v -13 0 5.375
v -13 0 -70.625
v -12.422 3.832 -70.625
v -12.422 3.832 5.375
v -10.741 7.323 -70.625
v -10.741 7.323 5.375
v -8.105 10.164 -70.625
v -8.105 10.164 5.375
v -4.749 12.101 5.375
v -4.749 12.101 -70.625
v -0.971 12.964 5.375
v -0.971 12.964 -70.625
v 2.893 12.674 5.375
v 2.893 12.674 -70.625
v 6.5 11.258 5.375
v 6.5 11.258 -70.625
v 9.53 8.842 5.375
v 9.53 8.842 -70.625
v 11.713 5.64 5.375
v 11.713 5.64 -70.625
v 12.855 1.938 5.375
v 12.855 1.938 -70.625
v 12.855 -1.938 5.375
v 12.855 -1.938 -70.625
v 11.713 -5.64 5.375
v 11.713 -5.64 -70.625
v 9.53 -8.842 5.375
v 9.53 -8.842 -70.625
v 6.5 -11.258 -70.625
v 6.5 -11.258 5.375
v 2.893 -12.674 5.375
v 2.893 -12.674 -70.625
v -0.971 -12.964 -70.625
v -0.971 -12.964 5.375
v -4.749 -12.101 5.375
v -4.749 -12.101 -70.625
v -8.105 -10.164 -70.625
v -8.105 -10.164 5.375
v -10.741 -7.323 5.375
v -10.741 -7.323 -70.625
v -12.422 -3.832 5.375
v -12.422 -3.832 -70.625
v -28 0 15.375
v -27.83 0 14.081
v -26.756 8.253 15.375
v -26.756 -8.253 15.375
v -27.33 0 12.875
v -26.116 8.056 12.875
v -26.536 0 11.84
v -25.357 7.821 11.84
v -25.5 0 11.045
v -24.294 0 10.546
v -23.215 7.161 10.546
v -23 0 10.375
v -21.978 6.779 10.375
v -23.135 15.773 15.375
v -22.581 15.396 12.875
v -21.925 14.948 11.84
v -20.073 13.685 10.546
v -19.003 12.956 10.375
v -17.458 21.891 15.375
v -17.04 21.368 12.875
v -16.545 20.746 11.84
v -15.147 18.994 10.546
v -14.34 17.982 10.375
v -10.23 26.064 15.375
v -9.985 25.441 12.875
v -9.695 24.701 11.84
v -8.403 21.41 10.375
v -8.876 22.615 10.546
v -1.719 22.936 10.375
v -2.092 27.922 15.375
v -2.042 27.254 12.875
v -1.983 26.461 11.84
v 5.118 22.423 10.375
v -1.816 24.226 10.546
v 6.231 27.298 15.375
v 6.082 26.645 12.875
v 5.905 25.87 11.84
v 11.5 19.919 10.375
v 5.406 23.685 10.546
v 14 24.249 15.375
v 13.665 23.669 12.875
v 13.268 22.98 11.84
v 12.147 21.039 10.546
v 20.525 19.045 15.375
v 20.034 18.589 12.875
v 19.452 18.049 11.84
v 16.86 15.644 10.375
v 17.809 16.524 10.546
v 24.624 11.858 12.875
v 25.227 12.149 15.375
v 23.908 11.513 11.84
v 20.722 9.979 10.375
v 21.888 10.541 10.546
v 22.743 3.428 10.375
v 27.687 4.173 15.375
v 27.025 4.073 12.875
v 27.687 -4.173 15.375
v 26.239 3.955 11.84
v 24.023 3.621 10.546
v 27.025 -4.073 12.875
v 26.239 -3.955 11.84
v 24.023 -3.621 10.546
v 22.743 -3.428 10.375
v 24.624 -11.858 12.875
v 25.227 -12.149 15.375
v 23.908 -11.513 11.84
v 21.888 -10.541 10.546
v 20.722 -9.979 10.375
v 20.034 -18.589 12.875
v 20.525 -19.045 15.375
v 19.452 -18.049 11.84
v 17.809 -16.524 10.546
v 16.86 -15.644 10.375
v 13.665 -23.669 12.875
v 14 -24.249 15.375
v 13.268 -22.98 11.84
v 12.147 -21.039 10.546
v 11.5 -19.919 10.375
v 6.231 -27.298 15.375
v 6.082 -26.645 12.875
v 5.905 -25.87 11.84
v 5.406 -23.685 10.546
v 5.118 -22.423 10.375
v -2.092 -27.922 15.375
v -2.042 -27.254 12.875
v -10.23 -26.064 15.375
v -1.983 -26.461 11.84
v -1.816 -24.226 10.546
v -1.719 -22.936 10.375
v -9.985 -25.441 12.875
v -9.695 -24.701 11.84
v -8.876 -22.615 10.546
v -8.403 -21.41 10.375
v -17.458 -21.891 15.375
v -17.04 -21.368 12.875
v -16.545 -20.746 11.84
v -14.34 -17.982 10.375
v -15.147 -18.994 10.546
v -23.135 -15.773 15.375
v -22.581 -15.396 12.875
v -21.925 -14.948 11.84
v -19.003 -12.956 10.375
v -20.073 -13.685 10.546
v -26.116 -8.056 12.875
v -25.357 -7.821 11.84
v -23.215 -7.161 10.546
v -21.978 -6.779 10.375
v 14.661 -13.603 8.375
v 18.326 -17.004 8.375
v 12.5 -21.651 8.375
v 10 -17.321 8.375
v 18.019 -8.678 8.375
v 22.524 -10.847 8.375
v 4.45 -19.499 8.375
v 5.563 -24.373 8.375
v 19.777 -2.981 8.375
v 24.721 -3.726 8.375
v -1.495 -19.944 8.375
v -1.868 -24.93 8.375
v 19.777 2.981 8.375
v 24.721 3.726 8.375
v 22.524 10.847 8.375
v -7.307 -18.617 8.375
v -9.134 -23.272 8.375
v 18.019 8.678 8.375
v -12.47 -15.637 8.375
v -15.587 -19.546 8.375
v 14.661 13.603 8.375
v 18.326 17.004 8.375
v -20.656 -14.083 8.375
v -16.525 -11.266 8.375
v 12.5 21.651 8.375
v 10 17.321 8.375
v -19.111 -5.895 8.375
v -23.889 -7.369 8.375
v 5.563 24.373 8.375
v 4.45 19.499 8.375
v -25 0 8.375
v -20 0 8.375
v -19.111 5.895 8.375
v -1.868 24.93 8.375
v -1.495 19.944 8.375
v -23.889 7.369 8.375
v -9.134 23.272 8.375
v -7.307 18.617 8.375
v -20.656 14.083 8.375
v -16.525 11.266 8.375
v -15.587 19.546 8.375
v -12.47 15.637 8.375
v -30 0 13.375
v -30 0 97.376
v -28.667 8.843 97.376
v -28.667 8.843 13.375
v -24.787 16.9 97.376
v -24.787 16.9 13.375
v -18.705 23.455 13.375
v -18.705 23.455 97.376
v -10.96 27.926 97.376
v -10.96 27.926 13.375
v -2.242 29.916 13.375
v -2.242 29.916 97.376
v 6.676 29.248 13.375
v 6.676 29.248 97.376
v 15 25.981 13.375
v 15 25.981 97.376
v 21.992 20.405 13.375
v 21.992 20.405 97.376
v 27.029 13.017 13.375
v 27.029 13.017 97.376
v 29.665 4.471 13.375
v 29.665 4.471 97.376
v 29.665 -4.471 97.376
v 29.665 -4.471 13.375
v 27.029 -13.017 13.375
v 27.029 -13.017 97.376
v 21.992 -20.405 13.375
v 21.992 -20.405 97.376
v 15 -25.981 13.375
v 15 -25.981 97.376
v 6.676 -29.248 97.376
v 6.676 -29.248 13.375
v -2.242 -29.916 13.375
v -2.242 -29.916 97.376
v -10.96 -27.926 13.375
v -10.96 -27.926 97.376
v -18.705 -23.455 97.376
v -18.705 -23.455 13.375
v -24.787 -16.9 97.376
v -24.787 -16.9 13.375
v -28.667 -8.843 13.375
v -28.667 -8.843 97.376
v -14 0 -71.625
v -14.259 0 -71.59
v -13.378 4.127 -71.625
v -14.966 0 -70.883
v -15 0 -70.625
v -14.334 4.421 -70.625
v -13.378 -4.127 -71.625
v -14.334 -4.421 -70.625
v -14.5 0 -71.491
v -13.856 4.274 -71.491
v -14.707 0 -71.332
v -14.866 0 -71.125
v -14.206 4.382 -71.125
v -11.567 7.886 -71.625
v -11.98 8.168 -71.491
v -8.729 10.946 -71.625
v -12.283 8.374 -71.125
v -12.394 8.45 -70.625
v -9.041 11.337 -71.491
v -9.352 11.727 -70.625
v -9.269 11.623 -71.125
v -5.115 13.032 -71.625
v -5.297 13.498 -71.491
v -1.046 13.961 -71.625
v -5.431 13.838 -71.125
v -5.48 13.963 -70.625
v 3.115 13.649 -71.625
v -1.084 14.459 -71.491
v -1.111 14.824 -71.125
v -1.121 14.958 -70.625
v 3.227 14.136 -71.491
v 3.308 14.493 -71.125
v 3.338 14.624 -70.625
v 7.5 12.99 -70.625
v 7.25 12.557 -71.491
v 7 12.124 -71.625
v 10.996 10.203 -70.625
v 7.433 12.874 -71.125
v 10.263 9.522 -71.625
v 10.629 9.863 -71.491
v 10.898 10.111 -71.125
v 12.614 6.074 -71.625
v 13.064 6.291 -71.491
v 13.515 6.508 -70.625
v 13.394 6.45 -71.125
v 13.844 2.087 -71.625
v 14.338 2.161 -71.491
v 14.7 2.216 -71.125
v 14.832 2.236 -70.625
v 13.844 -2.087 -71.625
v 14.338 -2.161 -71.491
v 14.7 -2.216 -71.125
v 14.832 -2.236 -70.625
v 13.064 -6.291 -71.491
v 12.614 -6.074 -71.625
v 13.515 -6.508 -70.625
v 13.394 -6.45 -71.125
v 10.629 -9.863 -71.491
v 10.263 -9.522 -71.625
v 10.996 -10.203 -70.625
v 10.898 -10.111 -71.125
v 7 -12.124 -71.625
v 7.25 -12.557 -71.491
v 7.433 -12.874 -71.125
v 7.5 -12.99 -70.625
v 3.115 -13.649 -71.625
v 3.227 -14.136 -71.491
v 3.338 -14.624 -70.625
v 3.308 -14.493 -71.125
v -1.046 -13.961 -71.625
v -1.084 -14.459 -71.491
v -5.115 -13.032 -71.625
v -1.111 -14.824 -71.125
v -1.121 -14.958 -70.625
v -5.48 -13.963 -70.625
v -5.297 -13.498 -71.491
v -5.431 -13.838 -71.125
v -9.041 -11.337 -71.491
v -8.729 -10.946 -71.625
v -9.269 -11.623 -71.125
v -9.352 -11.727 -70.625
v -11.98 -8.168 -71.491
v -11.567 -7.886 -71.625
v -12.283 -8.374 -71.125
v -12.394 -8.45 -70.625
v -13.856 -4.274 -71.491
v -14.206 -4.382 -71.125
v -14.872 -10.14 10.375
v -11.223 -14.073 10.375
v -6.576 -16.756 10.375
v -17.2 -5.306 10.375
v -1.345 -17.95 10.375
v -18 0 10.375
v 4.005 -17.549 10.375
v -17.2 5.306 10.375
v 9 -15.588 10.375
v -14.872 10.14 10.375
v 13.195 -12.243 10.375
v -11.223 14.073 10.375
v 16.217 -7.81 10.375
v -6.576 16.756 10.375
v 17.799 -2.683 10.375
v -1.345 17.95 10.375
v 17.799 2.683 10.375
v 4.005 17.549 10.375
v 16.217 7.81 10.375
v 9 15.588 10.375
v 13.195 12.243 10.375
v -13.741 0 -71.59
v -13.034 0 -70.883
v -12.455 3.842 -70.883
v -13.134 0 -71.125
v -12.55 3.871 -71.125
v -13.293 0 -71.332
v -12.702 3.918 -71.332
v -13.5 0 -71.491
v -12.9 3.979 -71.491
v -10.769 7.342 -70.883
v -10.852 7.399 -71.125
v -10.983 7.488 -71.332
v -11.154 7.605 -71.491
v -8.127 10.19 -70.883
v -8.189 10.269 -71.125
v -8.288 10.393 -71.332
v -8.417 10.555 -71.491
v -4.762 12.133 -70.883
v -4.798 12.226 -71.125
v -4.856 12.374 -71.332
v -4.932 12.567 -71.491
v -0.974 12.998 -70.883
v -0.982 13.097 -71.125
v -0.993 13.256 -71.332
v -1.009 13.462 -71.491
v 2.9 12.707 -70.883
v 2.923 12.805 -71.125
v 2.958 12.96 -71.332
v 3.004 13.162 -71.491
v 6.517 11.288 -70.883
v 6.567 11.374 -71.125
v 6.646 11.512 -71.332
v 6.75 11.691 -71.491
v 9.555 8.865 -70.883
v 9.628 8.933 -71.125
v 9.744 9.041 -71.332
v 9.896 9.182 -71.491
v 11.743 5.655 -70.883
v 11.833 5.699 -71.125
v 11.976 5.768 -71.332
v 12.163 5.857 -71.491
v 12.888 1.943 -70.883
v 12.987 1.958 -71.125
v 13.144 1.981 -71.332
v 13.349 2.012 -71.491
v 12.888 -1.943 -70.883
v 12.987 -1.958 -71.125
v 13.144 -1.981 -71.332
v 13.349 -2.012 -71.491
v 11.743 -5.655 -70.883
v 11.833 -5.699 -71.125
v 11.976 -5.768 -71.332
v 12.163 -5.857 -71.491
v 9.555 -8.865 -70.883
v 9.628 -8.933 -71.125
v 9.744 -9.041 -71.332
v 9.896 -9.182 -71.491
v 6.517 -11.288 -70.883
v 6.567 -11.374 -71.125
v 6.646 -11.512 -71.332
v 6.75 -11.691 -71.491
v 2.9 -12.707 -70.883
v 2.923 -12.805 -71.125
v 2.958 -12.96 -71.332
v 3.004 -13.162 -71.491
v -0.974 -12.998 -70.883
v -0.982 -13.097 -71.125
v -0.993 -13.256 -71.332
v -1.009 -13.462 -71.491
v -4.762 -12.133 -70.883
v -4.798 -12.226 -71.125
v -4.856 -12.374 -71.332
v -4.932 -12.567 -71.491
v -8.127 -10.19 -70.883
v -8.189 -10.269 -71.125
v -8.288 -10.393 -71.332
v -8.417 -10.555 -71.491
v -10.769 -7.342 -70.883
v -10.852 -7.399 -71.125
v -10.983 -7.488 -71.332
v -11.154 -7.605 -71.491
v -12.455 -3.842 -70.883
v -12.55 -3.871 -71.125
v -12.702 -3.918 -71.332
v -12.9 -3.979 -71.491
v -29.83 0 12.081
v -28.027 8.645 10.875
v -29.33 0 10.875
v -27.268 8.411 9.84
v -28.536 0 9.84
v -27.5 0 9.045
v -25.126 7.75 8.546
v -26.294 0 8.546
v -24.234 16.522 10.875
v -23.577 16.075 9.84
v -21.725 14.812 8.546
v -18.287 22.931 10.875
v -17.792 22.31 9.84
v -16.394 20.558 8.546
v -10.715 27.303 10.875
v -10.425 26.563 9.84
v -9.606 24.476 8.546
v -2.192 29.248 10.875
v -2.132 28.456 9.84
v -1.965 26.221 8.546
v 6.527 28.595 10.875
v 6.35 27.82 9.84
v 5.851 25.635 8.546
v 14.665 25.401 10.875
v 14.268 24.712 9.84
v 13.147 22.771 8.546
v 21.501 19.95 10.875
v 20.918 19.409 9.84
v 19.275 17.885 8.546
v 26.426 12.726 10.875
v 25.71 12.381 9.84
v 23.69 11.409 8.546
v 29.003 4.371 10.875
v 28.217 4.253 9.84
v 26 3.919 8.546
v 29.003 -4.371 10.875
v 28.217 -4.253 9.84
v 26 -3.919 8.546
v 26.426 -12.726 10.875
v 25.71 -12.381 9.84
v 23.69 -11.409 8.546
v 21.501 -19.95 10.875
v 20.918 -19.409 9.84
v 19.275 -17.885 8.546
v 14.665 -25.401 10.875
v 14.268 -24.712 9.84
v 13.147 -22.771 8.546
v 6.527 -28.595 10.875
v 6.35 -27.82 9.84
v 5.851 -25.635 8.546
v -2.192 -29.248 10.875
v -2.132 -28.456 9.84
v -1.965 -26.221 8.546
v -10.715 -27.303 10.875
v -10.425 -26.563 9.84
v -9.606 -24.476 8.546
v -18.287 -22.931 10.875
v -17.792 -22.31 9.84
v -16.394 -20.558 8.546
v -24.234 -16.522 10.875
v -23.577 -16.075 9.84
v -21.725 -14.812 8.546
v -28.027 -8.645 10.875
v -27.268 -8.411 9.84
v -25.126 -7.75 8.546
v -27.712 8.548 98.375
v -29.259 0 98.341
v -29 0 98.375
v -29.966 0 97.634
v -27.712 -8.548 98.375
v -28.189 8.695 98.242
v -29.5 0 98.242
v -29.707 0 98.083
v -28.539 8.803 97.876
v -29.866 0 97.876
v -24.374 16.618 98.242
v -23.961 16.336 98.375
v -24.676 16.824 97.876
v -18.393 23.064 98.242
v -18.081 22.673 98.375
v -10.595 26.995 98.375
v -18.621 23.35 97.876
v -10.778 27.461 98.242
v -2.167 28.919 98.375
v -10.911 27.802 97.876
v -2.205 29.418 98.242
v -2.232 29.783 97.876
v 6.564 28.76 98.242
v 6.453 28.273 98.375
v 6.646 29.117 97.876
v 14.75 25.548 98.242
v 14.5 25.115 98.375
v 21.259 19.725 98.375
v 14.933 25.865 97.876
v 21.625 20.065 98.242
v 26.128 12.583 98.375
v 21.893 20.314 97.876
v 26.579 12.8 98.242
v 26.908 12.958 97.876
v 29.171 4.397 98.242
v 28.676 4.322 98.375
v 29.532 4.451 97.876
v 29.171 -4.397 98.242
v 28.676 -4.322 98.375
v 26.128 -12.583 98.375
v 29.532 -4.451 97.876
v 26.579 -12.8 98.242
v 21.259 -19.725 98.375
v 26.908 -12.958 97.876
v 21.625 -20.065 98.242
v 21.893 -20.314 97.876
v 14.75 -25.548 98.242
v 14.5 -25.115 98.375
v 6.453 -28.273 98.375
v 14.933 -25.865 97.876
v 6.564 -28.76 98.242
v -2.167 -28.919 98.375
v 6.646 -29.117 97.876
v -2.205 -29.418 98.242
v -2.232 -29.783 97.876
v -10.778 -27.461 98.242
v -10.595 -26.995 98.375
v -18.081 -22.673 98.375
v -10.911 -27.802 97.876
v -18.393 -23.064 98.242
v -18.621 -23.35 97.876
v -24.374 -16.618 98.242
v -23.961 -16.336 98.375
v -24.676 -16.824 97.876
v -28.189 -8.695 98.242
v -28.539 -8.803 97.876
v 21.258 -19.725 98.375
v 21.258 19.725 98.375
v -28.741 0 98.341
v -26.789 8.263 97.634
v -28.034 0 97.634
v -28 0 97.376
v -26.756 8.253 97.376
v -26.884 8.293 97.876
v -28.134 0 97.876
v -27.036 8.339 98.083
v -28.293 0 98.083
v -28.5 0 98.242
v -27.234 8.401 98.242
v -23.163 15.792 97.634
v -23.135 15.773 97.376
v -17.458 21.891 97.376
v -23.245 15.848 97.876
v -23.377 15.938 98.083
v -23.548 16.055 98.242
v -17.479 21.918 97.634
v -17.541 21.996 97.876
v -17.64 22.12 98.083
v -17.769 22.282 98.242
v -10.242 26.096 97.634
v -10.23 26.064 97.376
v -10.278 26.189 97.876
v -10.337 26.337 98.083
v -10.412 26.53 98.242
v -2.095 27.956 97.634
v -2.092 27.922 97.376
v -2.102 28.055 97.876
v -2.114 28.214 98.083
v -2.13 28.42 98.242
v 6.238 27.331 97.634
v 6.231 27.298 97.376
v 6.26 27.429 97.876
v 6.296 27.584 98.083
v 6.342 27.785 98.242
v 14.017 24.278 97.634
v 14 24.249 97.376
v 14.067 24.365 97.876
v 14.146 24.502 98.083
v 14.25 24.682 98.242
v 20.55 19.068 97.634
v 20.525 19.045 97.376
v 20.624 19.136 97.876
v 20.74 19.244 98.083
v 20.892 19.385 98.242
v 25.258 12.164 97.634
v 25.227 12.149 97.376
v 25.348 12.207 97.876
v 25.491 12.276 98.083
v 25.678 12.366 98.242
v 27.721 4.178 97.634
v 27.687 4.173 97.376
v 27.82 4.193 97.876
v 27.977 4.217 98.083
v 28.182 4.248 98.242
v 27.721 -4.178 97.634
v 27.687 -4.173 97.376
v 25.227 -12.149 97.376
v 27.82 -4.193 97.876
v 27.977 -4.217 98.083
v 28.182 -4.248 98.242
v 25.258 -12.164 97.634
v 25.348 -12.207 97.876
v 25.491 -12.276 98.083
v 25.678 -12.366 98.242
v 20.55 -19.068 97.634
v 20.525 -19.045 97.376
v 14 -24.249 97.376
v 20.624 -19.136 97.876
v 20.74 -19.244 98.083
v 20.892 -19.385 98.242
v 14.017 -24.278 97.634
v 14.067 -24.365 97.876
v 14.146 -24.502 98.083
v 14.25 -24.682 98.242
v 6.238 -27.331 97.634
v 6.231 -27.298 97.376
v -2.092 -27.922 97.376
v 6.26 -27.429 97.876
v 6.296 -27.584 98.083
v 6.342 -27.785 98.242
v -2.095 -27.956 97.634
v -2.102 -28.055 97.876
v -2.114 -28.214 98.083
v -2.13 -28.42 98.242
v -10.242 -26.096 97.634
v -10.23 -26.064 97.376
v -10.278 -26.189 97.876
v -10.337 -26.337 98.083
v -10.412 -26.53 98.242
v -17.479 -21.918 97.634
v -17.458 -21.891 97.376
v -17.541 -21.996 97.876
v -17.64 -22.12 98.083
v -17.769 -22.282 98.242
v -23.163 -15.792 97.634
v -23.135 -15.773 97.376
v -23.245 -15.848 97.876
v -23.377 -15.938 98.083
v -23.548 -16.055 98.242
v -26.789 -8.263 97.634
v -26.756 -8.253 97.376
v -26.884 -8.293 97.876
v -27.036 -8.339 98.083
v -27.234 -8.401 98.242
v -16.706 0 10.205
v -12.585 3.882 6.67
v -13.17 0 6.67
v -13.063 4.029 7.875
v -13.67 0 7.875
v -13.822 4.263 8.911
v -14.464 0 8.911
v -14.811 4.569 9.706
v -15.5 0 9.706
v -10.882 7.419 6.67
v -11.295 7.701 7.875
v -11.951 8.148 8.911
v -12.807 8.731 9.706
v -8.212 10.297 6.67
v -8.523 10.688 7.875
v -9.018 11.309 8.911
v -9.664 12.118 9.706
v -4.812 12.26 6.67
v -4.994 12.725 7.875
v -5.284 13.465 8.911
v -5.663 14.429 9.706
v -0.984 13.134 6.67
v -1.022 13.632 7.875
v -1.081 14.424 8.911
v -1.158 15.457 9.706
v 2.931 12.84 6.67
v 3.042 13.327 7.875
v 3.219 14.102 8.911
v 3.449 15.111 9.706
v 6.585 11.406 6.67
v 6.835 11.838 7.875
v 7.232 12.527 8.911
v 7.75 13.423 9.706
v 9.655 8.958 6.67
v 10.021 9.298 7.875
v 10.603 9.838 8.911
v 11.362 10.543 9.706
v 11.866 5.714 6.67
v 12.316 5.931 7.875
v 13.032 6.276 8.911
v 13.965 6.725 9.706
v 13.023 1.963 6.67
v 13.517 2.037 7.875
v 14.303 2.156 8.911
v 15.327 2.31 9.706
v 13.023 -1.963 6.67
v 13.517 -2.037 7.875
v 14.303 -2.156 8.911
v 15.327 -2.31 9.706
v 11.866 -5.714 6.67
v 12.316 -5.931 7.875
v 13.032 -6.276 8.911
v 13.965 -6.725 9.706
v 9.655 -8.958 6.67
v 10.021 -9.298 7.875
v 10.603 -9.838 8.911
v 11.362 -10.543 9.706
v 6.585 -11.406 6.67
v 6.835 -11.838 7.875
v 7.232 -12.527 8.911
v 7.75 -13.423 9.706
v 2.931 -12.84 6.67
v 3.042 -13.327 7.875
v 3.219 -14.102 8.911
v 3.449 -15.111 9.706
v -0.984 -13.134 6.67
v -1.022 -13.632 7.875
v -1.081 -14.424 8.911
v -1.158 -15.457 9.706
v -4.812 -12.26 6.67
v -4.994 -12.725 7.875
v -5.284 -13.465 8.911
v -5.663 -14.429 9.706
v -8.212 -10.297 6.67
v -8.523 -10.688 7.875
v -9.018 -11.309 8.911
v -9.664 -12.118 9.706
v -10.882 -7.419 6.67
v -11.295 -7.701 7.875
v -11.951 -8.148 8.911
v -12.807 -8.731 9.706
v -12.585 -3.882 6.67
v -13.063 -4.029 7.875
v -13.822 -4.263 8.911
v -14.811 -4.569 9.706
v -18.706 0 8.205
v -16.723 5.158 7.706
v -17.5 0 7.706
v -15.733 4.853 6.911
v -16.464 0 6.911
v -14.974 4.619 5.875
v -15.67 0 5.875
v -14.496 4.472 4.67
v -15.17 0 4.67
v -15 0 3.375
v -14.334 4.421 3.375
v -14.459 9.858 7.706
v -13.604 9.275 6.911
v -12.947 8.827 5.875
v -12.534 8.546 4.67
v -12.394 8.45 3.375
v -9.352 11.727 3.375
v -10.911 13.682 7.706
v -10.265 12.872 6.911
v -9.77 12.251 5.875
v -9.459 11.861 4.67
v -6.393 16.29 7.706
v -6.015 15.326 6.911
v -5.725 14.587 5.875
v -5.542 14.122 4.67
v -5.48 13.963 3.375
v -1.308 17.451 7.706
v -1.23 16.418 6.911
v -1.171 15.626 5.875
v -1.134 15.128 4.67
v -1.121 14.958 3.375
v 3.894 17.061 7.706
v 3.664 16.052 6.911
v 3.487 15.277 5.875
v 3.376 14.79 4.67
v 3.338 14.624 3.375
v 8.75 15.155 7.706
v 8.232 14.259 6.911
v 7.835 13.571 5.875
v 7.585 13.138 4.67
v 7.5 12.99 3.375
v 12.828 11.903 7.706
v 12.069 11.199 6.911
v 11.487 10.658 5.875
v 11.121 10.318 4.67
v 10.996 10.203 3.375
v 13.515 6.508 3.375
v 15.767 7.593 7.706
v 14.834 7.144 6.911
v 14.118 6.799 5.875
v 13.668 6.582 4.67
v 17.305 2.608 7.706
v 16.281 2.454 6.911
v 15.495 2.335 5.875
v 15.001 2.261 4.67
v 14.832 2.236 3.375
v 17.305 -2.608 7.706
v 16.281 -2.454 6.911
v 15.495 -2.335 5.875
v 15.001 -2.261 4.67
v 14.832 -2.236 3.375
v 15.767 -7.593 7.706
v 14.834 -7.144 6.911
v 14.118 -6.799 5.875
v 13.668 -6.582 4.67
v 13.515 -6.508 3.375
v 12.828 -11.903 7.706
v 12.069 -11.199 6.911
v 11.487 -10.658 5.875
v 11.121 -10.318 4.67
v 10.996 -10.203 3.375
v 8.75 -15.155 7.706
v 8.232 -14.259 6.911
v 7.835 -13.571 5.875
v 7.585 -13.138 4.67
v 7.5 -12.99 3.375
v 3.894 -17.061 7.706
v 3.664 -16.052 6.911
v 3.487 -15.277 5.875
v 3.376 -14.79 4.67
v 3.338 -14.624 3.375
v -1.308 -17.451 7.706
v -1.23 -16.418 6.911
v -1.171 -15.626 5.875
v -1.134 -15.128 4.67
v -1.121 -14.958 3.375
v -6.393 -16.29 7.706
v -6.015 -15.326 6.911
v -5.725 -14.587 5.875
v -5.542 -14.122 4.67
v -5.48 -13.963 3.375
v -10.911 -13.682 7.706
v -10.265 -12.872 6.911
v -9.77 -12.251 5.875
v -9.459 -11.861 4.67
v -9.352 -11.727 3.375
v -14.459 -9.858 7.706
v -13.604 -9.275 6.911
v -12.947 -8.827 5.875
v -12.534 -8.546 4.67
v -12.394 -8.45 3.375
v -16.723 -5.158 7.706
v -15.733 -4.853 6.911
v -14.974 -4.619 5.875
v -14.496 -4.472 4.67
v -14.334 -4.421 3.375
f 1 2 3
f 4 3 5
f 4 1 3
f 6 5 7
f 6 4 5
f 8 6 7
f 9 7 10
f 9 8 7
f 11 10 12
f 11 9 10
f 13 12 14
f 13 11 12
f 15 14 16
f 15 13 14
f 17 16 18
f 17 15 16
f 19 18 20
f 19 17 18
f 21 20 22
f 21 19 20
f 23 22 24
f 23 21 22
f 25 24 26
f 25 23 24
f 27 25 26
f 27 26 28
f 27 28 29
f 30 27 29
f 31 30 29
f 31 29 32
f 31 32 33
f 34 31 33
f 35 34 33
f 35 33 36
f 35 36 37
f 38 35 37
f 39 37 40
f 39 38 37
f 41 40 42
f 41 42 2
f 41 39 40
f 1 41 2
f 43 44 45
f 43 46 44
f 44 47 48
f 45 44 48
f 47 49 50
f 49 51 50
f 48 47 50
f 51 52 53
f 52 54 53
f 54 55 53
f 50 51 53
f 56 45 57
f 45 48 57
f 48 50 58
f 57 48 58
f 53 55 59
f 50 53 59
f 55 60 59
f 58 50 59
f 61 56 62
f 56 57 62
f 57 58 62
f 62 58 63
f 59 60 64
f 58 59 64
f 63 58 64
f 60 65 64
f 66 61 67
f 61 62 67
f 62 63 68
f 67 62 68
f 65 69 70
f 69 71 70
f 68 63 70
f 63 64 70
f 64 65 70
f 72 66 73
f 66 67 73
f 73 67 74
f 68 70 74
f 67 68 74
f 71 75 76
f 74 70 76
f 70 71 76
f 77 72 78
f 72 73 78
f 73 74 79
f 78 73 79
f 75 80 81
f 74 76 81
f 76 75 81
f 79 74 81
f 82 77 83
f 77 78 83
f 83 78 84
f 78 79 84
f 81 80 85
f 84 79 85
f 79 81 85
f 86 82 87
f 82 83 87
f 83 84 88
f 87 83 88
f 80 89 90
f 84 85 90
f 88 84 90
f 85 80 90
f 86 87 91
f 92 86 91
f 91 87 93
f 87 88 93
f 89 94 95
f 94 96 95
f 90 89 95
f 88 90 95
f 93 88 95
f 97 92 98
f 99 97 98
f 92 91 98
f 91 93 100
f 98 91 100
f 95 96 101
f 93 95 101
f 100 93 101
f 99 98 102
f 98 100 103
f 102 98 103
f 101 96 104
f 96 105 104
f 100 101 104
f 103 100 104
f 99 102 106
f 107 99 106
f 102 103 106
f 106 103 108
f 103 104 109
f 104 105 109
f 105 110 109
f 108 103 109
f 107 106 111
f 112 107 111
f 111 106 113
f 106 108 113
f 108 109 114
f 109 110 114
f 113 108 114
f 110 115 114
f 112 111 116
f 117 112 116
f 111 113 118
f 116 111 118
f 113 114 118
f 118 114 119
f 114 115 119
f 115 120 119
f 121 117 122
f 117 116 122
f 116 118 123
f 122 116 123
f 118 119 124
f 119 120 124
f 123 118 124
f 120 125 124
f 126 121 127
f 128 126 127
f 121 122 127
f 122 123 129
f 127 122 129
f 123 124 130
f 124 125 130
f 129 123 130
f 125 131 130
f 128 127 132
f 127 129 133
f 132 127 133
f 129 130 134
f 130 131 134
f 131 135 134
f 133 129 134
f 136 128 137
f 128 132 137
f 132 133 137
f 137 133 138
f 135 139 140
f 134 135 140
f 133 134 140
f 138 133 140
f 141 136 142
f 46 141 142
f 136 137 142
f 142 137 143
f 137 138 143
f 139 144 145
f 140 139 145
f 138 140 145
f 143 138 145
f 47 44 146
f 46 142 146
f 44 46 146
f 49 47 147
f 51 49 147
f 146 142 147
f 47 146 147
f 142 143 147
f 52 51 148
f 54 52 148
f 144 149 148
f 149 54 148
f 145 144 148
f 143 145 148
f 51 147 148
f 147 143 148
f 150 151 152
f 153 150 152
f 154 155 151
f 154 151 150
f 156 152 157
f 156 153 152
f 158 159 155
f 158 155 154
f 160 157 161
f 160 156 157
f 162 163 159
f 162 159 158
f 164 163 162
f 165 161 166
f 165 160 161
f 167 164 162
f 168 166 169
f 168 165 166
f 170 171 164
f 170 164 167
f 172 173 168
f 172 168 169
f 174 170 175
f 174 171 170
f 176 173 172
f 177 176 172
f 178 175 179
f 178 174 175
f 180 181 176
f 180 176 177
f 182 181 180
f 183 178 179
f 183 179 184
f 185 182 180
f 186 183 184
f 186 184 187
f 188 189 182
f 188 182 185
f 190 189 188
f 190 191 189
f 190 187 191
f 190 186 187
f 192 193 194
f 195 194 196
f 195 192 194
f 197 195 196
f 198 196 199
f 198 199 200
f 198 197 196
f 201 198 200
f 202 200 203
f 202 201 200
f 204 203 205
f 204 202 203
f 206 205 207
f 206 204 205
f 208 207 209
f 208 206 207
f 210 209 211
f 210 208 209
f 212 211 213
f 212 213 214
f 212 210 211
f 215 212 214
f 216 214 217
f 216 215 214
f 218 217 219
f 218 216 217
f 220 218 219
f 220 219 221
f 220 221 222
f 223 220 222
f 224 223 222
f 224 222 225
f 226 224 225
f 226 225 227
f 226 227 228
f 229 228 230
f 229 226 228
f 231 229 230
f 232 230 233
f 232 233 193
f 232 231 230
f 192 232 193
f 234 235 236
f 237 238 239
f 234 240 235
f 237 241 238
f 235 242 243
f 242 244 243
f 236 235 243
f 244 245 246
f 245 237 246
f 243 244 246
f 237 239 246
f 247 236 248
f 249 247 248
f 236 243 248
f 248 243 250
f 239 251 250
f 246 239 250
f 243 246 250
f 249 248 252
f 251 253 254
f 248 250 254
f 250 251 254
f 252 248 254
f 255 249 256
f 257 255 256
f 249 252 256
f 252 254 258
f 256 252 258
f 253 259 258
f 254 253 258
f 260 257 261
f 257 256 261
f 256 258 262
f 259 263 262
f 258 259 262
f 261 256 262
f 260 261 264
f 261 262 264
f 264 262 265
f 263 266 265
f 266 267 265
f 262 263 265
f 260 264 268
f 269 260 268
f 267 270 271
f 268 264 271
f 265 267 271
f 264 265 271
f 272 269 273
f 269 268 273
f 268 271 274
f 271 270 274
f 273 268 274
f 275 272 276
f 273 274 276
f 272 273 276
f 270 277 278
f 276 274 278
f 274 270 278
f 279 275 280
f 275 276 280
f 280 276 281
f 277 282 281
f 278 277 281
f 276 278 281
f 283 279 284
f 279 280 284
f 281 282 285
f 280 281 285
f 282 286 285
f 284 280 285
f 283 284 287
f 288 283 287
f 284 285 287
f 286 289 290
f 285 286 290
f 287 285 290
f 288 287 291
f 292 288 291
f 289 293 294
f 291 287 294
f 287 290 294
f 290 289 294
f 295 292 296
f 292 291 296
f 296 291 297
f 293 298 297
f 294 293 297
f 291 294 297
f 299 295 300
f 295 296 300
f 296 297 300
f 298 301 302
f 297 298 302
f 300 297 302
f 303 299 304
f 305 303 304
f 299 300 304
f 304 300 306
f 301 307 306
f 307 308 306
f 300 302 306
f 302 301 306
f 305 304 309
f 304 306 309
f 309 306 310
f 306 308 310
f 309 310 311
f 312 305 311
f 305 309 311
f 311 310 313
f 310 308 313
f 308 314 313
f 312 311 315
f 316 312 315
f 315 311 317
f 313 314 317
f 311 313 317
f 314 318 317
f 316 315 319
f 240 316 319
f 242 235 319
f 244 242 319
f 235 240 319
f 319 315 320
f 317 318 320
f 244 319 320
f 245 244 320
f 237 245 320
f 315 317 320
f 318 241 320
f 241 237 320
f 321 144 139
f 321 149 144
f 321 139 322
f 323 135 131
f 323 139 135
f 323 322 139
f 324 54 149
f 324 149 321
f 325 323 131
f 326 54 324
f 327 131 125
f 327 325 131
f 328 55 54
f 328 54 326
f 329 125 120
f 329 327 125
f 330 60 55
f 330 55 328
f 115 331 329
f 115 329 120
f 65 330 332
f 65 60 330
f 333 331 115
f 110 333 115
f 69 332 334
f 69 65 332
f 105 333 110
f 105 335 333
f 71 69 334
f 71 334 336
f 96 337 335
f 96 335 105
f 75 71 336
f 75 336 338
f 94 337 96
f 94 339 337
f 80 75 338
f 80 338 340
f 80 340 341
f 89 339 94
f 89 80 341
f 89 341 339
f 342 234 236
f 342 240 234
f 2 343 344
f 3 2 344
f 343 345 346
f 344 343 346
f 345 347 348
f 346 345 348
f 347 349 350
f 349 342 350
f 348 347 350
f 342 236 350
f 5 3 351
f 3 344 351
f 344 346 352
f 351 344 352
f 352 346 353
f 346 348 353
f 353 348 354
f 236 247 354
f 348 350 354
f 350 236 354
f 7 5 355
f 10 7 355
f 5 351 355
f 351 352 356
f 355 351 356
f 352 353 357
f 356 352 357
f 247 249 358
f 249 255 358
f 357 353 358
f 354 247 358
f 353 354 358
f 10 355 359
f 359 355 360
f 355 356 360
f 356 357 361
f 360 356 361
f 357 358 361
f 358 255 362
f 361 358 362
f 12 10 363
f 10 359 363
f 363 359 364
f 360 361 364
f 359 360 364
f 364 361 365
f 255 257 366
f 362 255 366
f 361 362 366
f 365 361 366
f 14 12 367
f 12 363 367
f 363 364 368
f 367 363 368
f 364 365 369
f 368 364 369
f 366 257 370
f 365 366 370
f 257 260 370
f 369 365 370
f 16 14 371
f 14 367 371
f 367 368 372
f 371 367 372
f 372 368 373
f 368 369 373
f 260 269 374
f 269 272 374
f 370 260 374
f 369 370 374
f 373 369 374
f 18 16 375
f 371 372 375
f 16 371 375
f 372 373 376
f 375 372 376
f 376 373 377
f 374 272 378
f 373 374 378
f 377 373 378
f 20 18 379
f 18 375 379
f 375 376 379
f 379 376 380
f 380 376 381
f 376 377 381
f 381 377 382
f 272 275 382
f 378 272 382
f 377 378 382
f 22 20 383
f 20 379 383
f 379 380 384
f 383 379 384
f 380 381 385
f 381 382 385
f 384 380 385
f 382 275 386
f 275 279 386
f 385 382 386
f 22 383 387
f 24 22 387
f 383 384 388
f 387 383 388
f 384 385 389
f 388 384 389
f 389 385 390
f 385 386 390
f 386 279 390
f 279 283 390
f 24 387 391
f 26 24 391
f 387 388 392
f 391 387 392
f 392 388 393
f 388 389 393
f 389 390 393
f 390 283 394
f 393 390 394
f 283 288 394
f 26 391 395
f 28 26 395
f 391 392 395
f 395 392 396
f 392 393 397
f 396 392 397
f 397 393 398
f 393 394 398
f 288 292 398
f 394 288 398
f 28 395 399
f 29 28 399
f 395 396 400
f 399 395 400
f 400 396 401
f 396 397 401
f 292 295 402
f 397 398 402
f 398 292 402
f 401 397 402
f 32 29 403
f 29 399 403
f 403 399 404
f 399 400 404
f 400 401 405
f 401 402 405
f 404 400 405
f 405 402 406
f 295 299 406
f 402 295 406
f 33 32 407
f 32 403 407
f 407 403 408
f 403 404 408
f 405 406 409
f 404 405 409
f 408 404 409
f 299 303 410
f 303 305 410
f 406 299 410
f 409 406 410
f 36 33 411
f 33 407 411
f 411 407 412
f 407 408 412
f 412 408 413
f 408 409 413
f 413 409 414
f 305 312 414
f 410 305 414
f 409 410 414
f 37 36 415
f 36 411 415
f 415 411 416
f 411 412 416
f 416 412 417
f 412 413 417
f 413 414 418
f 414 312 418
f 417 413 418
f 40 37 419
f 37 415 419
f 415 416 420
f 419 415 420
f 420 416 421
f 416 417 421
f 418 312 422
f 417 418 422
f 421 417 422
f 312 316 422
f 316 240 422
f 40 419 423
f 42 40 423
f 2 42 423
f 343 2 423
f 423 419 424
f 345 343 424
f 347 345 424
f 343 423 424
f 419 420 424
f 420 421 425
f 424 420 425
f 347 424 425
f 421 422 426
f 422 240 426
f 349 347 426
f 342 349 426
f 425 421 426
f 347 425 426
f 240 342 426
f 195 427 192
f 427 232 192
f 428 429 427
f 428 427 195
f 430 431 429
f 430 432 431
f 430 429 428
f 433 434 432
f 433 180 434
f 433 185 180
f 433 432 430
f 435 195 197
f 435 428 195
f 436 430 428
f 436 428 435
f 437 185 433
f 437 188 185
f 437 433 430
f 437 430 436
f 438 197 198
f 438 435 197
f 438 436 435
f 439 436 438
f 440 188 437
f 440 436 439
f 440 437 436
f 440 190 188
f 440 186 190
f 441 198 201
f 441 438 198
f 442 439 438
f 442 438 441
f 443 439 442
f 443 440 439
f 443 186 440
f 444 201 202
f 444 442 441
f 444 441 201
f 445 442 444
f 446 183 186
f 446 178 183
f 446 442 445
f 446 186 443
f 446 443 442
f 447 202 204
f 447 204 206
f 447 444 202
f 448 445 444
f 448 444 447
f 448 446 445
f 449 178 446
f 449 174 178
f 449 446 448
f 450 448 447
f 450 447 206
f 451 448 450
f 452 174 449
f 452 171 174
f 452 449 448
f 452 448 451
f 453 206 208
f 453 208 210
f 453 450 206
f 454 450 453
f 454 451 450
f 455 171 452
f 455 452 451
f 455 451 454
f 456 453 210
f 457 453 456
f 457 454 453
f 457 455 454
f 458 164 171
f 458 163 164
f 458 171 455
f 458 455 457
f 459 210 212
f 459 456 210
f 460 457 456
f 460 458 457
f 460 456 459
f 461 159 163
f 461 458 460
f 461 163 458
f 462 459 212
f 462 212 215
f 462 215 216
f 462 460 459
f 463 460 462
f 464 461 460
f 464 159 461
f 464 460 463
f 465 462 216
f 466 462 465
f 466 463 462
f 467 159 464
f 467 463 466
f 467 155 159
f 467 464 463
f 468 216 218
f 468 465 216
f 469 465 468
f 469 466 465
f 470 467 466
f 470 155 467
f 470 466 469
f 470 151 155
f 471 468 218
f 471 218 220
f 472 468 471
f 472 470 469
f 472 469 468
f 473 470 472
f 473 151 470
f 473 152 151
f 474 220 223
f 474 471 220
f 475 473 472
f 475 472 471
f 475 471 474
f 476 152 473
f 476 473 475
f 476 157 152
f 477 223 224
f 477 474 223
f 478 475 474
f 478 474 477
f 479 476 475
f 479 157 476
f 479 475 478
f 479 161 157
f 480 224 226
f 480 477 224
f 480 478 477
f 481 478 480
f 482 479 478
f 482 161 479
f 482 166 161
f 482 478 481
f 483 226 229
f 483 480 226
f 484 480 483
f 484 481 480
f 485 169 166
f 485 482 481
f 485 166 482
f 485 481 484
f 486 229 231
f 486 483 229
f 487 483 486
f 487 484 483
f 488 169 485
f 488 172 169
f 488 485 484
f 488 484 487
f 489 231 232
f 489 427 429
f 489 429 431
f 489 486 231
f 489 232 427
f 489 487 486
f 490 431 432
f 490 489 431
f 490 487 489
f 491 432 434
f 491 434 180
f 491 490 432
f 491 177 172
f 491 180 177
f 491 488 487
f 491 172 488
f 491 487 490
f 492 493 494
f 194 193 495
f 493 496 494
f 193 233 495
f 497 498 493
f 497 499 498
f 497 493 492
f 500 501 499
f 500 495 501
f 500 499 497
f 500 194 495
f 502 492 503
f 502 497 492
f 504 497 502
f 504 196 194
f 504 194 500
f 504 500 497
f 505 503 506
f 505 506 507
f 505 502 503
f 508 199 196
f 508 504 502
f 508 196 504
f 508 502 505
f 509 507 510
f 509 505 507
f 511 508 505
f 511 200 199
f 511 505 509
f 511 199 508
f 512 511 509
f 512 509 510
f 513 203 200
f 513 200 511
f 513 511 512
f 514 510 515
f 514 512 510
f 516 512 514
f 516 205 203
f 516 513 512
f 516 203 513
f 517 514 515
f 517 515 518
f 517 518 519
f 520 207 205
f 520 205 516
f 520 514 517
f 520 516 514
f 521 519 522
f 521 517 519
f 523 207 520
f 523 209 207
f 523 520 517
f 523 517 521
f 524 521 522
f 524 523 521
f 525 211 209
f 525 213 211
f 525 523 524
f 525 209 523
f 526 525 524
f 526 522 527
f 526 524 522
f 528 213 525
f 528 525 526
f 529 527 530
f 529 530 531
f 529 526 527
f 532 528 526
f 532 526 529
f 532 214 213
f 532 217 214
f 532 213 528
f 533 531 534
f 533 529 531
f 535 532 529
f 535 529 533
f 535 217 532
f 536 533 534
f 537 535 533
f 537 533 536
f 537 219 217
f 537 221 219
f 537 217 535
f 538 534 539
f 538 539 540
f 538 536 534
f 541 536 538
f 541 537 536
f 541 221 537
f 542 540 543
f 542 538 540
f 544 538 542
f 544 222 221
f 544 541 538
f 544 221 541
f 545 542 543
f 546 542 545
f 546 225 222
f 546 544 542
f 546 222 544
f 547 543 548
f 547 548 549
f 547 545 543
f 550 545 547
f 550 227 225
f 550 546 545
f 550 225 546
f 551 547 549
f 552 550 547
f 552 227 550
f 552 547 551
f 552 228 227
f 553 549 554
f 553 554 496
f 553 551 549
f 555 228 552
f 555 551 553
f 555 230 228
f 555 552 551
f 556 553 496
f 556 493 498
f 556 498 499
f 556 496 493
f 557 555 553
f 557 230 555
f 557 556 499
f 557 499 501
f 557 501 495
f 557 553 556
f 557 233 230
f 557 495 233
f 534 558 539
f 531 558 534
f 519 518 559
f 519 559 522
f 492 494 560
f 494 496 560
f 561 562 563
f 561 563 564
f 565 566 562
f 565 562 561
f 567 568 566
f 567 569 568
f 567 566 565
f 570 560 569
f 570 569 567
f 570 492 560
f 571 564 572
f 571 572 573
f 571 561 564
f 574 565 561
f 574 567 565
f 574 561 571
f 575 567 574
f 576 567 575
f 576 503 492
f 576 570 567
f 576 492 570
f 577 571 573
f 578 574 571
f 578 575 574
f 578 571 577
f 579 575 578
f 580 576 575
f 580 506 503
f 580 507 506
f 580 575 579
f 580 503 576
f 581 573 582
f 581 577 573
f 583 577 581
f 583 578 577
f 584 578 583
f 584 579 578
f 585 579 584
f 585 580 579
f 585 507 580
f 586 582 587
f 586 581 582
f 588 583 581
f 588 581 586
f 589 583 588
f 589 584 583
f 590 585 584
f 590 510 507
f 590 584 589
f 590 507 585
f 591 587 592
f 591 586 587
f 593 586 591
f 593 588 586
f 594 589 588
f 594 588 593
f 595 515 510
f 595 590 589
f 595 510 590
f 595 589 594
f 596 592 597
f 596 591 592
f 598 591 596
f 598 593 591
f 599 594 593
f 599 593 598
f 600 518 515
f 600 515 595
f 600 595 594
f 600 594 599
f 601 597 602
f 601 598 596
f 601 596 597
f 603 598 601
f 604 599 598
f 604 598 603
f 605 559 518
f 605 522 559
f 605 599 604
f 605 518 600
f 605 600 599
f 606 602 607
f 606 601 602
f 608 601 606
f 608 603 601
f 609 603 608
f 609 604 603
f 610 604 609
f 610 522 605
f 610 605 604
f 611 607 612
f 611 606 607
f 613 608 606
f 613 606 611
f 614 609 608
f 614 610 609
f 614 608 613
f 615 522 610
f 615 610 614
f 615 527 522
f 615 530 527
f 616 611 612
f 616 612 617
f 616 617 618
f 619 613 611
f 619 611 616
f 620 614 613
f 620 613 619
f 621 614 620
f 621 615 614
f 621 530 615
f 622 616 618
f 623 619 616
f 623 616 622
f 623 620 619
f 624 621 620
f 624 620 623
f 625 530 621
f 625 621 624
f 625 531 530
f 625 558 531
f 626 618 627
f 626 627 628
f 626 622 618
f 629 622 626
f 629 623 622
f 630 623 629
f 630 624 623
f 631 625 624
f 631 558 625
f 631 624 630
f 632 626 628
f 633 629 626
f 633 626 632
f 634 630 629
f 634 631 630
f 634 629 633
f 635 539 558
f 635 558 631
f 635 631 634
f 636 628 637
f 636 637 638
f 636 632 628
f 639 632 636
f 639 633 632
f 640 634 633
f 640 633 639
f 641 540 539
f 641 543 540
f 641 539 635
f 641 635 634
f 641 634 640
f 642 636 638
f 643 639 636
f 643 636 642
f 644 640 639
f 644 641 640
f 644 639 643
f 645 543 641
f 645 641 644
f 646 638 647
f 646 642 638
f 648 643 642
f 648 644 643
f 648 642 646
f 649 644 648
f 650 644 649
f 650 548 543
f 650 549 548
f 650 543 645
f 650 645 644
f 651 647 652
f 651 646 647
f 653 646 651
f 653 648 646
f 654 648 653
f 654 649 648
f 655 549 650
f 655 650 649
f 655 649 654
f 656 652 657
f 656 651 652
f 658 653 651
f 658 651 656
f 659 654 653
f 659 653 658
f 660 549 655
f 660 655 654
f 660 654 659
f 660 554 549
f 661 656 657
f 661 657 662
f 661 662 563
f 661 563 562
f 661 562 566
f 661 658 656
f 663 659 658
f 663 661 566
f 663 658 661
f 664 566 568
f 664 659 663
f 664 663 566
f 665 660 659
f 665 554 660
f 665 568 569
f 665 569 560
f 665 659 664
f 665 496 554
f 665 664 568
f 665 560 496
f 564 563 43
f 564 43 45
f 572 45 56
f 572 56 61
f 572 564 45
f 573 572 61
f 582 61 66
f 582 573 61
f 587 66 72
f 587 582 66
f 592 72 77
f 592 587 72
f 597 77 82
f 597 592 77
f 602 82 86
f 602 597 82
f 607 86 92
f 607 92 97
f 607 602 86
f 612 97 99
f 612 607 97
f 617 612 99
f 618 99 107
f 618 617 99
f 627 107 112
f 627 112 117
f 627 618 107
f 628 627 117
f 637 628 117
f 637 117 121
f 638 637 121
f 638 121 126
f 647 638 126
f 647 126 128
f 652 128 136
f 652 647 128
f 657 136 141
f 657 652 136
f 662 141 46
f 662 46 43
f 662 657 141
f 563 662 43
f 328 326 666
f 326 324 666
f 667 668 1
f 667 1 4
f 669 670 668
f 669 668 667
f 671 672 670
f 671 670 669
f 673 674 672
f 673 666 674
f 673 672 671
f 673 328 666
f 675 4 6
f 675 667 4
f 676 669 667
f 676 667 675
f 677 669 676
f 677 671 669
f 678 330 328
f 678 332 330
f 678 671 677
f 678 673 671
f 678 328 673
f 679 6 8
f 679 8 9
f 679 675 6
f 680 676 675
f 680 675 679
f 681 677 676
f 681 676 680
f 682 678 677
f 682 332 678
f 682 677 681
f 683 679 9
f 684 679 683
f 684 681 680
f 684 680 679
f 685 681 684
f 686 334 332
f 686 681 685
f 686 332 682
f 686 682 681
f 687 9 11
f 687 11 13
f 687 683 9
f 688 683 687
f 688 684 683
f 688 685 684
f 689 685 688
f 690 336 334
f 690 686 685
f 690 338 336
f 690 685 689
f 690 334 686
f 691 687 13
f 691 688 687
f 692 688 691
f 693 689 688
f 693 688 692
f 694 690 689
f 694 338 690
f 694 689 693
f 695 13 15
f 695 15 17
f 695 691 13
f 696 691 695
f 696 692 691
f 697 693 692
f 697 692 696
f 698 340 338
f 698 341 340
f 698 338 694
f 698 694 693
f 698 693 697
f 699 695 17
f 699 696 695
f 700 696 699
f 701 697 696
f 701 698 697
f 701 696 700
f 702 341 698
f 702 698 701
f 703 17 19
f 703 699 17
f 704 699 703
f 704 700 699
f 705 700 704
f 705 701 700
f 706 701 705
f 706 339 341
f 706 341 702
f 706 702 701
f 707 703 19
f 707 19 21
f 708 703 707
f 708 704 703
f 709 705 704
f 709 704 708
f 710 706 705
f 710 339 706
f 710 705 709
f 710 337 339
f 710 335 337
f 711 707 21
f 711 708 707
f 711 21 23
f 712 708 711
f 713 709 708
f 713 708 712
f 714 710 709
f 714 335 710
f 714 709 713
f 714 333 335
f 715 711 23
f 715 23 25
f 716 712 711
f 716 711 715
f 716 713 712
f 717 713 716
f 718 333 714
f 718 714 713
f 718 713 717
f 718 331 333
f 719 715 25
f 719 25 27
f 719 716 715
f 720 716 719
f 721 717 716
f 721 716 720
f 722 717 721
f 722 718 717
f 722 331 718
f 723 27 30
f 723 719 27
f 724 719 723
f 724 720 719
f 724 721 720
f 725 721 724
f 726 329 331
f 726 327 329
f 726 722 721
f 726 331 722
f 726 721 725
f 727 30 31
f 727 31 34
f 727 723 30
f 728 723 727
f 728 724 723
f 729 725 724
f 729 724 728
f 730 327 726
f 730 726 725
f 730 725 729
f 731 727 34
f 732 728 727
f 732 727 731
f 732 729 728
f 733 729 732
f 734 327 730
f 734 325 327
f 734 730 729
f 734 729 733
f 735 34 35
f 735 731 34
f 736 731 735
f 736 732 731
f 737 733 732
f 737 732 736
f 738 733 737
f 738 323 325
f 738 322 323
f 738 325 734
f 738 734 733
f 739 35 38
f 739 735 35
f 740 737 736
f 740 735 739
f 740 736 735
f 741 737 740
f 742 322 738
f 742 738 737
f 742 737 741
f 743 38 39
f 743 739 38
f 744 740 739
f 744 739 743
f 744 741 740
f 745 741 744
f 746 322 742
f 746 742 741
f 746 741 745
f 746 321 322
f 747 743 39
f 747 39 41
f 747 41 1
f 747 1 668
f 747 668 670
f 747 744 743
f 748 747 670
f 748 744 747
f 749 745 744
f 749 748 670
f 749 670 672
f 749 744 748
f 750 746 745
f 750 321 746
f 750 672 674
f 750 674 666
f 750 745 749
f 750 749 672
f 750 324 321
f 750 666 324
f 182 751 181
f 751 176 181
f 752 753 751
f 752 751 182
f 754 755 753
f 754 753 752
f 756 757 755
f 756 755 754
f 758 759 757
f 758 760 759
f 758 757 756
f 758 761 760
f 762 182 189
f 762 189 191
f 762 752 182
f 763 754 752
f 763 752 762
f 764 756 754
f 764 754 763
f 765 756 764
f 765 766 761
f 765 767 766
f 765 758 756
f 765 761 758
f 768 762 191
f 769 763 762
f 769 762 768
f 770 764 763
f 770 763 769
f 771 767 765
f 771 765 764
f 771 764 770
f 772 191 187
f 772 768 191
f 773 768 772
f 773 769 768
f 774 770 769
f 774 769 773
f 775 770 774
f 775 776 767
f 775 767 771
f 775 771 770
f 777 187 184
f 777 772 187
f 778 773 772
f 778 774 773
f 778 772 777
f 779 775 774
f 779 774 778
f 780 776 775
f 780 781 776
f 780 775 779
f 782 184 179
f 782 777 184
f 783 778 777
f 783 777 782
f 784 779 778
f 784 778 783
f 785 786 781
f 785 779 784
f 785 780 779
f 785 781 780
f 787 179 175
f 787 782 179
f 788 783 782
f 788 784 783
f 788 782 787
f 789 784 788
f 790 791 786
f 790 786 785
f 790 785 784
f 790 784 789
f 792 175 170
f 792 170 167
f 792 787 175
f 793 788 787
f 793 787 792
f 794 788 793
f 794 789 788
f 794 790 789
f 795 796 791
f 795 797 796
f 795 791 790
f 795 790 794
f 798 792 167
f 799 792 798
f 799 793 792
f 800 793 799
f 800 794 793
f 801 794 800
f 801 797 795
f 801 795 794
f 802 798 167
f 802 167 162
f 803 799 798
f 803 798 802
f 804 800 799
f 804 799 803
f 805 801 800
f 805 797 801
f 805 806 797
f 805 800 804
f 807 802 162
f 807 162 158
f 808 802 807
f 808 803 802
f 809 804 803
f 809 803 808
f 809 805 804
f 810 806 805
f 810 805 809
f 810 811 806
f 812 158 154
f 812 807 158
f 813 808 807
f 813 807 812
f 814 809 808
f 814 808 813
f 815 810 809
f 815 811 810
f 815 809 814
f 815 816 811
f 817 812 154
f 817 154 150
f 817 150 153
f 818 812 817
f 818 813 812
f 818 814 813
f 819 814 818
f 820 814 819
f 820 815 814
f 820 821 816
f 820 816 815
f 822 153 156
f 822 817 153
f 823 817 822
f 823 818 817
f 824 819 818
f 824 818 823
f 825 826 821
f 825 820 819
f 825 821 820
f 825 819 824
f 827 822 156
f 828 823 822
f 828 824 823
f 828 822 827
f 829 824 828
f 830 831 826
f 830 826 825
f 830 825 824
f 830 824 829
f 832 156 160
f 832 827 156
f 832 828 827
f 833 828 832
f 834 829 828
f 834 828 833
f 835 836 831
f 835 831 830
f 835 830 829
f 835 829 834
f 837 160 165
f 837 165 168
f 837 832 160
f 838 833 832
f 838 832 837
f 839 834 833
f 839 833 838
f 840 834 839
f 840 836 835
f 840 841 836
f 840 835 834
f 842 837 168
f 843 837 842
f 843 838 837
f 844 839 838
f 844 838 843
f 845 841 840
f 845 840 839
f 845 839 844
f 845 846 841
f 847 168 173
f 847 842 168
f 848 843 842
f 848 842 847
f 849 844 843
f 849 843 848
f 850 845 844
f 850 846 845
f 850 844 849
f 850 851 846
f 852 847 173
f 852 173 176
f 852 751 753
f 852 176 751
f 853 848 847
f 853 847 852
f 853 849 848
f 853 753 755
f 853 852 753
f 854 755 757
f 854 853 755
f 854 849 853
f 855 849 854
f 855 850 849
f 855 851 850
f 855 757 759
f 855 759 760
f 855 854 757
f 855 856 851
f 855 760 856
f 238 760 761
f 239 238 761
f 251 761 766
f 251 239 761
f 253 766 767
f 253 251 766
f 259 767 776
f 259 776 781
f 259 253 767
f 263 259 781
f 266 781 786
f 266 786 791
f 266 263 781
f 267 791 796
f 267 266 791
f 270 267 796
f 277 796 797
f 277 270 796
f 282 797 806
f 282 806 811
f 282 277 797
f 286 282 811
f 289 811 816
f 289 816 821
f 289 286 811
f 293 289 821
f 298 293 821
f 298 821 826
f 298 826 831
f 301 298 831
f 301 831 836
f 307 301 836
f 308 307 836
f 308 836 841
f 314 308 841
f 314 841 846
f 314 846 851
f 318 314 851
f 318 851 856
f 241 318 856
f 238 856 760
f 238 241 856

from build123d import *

# Parameters (mm, degrees)
F2_R = 5
F3_R = 0.99999


# Not quite as in the source:
# - a fillet or chamfer is up to 0.001 mm smaller than in the source, because OpenCascade refuses the exact size


with BuildPart() as f1:
    # F0 (on Front) → F1 (revolve)
    with BuildSketch(Plane.XZ):
        Polygon((-28, 10.3754994379), (-28, 98.3754994379), (-30, 98.3754994379), (-30, 8.3754994379), (-15, 8.3754994379), (-15, -71.6245005621), (-13, -71.6245005621), (-13, 10.3754994379), align=None)
    revolve(axis=Axis((0, 0, 13.3754994379), (0, 0, -1)))

    # F2
    f2_edges = [f1.edges().sort_by_distance(p)[0] for p in [
        (30, 0, 8.375499),
        (15, 0, 8.375499),
        (28, 0, 10.375499),
        (13, 0, 10.375499),
    ]]
    fillet(f2_edges, radius=F2_R)

    # F3 (radius 1 in the source; OpenCascade refuses exactly that, so slightly less here)
    f3_edges = [f1.edges().sort_by_distance(p)[0] for p in [
        (28, 0, 98.375499),
        (30, 0, 98.375499),
        (15, 0, -71.624501),
        (13, 0, -71.624501),
    ]]
    fillet(f3_edges, radius=F3_R)


solid = f1.part
